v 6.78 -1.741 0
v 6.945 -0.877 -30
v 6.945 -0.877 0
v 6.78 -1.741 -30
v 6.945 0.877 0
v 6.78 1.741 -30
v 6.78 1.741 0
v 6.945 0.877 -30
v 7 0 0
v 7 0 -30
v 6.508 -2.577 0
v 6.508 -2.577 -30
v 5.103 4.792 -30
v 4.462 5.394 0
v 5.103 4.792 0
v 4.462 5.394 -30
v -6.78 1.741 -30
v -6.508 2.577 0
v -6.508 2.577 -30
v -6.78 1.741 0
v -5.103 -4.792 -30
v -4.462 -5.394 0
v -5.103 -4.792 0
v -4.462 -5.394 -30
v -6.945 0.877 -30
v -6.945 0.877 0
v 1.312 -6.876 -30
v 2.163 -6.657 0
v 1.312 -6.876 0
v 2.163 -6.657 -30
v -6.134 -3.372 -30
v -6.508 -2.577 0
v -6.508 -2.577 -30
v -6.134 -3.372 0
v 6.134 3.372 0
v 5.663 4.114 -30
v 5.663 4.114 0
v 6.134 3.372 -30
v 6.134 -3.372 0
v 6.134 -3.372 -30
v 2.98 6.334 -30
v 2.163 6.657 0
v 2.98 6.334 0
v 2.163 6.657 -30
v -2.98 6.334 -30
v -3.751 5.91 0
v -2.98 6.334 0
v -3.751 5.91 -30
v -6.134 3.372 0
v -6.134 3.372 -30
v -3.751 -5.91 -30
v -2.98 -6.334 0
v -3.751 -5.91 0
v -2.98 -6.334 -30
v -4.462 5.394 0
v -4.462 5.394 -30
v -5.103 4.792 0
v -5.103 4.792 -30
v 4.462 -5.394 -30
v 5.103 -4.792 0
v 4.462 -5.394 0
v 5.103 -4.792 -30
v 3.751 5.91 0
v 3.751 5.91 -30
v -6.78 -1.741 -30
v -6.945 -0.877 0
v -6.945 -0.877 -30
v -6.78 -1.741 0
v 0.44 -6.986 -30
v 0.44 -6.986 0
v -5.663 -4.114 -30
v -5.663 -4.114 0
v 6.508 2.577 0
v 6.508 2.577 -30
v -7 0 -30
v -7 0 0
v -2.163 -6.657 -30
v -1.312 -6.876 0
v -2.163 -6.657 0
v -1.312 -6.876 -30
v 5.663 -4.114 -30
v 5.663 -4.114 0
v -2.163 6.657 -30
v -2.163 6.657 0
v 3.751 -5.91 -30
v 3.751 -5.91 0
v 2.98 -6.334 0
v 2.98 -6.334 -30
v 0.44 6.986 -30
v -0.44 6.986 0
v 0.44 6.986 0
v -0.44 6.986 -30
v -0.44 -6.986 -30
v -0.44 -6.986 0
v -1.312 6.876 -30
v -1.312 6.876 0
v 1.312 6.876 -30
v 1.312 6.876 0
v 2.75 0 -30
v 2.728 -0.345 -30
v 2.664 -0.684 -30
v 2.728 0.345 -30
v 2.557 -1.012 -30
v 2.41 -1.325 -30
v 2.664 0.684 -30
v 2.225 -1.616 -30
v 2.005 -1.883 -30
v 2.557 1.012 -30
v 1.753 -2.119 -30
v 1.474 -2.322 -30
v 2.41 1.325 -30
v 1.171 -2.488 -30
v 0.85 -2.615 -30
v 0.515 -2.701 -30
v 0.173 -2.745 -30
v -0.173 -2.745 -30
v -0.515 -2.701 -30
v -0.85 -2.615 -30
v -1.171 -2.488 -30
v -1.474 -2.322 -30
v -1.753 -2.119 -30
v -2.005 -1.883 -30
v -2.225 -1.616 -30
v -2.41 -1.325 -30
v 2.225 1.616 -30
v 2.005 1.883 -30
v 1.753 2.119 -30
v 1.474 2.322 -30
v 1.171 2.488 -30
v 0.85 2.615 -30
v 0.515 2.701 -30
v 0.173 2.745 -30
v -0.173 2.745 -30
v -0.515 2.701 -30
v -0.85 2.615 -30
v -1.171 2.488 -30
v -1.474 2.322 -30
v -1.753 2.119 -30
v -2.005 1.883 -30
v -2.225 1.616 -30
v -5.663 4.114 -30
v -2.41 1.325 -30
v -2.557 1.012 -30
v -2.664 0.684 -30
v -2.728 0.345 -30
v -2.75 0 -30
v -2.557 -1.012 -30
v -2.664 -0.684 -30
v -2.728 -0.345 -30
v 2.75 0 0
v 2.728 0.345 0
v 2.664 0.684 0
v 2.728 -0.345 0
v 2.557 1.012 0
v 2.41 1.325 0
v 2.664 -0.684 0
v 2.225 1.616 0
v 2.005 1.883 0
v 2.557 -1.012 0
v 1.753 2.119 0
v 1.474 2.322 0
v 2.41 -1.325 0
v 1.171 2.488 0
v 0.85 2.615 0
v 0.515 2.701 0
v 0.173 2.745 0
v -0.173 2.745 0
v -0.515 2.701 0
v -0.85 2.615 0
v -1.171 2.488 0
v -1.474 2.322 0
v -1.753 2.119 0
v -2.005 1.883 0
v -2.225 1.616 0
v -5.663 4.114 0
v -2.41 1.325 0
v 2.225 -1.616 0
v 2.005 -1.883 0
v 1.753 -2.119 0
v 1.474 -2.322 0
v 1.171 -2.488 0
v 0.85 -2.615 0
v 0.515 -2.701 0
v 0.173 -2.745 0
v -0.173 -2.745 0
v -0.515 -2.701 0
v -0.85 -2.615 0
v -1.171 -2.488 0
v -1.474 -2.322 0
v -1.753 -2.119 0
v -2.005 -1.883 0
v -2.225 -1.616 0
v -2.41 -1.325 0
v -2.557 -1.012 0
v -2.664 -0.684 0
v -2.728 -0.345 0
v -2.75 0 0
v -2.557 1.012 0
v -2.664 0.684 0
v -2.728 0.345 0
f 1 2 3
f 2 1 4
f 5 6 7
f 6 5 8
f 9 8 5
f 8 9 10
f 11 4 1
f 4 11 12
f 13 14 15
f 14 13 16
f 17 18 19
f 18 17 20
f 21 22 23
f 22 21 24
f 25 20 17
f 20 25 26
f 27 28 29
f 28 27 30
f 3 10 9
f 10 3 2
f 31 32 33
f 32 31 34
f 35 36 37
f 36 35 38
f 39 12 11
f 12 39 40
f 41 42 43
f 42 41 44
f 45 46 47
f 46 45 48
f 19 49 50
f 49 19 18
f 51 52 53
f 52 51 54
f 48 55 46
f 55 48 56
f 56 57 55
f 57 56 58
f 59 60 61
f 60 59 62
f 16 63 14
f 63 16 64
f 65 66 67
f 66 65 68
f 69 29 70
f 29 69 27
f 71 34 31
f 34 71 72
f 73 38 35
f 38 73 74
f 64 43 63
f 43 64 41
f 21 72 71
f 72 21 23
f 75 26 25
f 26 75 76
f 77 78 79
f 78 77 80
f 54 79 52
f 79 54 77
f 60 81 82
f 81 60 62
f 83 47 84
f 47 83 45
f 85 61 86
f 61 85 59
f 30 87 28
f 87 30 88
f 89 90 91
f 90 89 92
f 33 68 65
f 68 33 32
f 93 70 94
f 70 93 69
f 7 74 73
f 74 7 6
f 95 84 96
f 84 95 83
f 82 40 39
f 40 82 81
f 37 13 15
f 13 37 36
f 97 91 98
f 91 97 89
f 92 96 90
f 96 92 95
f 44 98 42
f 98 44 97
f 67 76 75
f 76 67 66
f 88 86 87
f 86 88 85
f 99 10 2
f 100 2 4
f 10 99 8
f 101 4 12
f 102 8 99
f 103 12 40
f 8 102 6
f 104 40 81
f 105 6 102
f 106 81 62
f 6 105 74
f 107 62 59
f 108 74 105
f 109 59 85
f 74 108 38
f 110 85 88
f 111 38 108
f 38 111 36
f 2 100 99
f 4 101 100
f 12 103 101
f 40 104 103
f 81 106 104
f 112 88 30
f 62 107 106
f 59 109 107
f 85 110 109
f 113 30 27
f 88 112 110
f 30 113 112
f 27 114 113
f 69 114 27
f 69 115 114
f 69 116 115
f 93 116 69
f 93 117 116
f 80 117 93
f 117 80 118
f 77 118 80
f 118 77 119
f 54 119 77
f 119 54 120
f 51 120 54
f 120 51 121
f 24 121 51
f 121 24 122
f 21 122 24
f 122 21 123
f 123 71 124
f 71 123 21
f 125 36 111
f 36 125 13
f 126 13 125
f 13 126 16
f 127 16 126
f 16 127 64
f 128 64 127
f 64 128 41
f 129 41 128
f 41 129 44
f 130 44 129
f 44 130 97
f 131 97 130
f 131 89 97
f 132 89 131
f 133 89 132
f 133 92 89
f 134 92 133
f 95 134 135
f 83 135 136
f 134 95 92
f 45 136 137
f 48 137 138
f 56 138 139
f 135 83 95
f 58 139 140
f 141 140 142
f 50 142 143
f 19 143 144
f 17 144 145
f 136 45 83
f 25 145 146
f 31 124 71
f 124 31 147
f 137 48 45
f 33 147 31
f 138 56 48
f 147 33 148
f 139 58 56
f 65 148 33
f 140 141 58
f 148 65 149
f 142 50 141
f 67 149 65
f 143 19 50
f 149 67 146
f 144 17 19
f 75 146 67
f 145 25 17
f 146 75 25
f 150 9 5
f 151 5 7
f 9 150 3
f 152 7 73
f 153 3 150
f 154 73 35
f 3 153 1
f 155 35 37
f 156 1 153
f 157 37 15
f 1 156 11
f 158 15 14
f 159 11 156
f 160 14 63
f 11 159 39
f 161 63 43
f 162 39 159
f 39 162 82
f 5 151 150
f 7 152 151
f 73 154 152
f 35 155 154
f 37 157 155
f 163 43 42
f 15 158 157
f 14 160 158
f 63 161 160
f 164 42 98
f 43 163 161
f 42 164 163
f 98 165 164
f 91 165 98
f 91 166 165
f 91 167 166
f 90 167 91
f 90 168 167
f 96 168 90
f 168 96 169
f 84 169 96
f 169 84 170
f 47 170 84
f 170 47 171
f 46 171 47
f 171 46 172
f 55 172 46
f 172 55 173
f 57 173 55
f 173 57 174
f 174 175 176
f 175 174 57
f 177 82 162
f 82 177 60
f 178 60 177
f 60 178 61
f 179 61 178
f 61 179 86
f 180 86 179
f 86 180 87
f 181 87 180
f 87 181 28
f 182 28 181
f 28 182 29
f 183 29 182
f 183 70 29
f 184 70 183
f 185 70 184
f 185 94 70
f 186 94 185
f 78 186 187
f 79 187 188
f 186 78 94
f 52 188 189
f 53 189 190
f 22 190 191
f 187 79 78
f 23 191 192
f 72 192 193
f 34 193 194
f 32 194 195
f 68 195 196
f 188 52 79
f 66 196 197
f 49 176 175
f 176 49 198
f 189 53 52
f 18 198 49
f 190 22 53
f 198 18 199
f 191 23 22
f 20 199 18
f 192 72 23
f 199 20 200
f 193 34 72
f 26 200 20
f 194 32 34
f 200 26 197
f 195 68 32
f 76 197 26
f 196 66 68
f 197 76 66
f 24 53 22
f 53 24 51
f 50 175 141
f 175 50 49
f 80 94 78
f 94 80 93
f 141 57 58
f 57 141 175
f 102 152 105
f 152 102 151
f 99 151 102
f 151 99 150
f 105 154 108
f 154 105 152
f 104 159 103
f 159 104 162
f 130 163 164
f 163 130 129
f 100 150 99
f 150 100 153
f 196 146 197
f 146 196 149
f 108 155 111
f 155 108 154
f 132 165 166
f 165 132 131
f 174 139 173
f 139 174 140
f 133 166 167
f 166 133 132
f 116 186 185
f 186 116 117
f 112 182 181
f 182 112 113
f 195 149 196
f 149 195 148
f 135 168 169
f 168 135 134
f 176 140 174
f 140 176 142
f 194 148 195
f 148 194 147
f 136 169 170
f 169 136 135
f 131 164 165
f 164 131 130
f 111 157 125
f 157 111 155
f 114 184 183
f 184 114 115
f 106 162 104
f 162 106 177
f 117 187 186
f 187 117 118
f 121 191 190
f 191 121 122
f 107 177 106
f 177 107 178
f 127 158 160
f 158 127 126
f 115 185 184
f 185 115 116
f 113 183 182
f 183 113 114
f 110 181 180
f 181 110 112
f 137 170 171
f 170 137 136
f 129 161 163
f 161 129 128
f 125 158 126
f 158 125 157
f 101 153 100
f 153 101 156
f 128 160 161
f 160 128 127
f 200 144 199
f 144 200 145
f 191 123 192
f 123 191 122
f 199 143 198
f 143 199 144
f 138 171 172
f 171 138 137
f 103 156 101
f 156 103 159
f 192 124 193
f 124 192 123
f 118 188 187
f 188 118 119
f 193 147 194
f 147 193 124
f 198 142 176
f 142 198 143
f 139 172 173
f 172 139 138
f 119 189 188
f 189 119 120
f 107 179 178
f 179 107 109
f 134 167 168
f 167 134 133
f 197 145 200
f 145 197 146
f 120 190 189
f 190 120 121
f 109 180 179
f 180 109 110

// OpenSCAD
$fn = 50;


difference() {
	union() {
		translate(v = [0, 0, -30.0000000000]) {
			cylinder(h = 30, r = 7.0000000000);
		}
		cylinder(h = 0, r = 10.0000000000);
	}
	union() {
		#translate(v = [0, 0, -30]) {
			cylinder(h = 30, r = 2.7500000000);
		}
	}
}
